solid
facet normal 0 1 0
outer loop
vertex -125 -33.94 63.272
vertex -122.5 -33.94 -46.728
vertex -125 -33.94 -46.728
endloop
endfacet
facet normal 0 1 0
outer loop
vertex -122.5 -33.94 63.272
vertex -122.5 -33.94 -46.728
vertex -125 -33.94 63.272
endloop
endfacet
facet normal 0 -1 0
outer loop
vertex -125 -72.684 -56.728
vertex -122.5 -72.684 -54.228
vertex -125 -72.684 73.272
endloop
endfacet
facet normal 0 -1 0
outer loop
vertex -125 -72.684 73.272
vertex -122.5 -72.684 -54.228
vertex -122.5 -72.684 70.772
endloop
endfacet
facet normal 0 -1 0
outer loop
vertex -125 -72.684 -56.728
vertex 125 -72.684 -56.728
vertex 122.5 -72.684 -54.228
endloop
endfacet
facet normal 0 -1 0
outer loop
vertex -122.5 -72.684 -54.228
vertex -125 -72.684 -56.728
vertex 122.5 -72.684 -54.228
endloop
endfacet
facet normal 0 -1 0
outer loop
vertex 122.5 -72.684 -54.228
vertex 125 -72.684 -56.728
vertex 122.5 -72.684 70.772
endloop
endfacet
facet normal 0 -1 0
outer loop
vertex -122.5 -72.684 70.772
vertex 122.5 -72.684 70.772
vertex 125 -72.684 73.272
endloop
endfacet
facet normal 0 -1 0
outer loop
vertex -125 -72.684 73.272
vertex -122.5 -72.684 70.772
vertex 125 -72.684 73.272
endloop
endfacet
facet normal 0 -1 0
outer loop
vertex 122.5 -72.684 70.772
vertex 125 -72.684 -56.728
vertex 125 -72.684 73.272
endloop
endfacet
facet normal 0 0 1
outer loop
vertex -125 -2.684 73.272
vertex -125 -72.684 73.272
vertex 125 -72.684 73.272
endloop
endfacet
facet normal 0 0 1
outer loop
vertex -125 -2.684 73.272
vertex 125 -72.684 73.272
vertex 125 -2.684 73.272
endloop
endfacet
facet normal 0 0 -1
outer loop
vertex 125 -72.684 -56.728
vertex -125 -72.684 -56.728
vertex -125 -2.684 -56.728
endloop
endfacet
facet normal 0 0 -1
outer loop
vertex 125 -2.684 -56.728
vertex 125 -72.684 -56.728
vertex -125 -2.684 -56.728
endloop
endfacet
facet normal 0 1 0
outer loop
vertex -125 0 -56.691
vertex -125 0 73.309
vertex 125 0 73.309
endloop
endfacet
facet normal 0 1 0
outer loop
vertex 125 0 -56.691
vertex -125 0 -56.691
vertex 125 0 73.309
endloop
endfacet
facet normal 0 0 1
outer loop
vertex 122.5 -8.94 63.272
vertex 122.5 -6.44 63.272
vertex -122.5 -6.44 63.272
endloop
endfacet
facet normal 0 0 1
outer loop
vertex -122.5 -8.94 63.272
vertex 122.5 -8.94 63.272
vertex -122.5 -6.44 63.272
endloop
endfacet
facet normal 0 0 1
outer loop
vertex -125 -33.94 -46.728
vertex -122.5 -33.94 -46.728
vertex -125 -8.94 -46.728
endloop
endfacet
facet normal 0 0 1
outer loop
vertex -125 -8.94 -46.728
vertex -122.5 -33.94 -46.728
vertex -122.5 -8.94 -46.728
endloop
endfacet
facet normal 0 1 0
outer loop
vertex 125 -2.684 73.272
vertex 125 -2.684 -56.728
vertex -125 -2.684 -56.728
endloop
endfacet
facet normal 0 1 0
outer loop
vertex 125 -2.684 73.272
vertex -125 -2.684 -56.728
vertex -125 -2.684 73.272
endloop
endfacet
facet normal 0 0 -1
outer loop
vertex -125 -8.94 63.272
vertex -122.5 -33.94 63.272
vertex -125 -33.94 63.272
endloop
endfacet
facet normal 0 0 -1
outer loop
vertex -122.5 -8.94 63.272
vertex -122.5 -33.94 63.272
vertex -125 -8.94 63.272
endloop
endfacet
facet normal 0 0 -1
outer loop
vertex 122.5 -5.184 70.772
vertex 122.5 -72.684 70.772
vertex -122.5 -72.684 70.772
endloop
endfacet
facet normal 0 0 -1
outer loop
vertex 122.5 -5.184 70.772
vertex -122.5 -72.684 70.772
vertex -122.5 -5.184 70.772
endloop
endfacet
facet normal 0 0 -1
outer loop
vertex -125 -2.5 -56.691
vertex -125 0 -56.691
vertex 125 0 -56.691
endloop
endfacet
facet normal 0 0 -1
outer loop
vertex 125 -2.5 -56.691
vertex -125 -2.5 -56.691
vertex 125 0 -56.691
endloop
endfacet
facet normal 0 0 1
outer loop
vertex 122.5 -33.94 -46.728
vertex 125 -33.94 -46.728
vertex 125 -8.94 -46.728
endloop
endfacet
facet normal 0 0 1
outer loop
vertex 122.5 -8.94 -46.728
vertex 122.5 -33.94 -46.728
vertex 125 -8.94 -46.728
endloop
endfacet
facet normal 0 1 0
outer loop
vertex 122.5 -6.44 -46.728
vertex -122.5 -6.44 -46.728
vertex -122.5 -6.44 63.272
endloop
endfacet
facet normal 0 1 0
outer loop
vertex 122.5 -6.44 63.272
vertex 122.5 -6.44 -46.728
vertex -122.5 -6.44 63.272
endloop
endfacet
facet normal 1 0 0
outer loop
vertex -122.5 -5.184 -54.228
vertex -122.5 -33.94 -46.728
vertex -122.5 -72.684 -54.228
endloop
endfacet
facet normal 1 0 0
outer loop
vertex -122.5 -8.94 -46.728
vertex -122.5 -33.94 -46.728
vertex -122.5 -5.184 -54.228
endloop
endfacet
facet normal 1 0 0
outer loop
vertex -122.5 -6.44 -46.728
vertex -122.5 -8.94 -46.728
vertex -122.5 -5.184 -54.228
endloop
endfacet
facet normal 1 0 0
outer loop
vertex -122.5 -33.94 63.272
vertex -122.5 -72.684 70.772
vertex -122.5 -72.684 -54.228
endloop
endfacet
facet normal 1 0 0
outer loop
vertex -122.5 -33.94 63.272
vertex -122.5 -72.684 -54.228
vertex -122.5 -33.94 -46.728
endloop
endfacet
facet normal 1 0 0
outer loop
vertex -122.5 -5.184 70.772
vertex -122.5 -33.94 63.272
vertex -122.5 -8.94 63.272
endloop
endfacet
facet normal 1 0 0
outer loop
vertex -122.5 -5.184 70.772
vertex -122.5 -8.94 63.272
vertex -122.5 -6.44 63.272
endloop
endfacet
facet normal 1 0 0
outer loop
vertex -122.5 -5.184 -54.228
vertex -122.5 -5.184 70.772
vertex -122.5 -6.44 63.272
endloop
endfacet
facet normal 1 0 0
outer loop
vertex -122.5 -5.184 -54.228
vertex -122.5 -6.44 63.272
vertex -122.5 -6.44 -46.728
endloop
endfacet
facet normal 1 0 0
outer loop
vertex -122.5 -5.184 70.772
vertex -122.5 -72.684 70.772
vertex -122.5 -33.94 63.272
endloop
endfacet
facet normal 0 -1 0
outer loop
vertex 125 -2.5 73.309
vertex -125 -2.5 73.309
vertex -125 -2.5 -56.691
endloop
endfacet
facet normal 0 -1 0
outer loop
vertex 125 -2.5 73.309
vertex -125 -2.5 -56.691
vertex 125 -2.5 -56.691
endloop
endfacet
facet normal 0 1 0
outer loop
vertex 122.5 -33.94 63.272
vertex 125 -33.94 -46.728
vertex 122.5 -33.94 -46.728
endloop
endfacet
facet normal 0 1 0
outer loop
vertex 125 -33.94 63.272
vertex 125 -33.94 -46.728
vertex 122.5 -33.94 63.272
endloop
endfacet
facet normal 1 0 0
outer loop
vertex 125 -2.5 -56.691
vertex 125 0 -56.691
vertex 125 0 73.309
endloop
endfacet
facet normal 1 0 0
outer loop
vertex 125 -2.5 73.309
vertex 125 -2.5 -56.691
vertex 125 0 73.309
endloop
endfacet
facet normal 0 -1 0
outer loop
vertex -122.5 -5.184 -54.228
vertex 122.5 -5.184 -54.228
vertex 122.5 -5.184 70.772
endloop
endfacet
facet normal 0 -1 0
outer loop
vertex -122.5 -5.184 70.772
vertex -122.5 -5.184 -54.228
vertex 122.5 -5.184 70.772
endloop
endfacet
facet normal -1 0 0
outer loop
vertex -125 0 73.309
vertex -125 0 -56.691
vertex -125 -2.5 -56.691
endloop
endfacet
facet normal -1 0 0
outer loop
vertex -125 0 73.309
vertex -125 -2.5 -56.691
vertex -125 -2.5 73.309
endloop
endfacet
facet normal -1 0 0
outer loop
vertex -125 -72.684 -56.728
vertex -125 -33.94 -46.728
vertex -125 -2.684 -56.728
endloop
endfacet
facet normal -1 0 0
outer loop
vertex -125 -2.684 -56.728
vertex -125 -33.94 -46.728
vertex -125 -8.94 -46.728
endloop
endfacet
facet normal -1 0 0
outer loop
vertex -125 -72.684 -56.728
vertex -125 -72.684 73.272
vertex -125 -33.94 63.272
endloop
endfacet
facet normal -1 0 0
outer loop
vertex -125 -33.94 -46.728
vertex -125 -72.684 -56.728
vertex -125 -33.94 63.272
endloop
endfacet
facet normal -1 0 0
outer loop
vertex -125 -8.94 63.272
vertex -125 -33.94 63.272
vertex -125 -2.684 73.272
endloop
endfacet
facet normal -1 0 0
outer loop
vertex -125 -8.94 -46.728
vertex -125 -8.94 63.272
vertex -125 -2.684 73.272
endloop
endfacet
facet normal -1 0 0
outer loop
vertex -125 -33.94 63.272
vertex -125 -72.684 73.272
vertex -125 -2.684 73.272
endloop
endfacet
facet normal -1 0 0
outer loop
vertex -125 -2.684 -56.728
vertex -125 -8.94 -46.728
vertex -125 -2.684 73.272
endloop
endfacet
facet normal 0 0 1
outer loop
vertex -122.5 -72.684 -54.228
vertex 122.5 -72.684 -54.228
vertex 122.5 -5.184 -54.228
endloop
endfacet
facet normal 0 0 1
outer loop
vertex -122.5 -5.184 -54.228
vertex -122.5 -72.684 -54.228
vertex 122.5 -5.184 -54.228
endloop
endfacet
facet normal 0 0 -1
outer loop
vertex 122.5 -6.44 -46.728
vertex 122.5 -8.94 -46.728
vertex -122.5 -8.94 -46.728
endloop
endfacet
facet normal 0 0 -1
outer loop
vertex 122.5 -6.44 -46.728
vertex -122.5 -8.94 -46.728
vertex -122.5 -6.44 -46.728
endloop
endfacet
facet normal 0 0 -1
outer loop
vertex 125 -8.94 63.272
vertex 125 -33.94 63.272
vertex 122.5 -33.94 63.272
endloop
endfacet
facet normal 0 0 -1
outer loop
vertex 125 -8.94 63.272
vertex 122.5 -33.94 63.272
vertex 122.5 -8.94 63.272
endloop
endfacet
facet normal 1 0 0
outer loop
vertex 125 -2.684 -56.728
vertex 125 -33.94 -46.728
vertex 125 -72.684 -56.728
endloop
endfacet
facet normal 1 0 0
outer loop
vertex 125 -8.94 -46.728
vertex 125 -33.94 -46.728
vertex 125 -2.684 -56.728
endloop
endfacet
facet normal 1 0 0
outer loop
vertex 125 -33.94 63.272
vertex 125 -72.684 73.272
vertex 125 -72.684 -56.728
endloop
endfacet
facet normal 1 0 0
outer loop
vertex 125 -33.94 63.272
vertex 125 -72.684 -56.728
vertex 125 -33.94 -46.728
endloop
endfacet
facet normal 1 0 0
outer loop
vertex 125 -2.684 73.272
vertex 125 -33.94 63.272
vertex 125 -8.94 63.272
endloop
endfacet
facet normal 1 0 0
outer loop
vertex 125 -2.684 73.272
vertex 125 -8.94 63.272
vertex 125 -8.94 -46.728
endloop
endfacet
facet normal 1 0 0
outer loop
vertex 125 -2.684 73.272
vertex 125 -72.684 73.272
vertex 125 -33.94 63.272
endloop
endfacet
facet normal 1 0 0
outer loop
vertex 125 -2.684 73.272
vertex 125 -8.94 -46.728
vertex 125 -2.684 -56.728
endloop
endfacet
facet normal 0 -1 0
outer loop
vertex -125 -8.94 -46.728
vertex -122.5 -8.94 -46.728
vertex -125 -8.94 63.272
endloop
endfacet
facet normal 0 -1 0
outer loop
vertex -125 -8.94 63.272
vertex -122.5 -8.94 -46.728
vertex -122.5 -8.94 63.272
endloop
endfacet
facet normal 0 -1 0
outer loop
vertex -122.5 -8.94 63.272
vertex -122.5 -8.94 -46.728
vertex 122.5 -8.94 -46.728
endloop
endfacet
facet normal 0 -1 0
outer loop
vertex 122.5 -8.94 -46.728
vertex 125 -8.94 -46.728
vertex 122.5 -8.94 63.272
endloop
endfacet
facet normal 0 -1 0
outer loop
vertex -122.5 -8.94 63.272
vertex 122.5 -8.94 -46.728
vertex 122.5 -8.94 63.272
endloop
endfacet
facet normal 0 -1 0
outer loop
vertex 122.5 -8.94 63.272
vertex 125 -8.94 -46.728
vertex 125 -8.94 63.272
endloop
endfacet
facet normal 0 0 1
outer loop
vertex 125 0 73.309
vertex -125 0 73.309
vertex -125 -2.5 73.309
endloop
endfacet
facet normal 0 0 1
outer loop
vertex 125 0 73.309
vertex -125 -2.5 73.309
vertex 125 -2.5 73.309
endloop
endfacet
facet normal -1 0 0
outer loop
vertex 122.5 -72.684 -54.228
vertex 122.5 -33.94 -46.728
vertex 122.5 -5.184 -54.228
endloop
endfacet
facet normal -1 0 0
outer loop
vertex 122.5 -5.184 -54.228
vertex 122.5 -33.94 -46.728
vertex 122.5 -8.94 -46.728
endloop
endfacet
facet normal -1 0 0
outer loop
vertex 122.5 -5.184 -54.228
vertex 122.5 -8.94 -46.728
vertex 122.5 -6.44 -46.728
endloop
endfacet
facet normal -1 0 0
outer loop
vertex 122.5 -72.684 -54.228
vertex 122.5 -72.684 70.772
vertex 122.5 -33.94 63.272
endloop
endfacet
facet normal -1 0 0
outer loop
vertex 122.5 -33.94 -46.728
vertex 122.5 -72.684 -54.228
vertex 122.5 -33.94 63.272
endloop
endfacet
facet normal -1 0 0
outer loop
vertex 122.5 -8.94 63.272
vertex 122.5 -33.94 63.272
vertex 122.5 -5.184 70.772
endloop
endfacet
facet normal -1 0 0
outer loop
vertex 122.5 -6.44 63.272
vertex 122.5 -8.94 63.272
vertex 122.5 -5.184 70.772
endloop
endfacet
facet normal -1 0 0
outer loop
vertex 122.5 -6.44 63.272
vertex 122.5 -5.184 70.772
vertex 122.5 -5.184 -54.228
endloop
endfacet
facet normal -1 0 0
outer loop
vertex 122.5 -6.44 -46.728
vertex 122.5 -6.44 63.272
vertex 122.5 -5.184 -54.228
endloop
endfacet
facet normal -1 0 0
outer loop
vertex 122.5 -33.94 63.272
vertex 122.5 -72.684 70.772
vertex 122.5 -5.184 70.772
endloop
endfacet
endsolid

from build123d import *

# Parameters (mm, degrees)
F0_W     = 250
F0_H     = 130
F1_DEPTH = 2.5
F2_W     = 70
F2_H     = 130
F2_W_2   = 25
F2_H_2   = 110
F3_DEPTH = 125
F4_T     = 2.5


# Not quite as in the source:
# - a shell that OpenCascade refuses in one call is made with other operations: the cavity is built on its own and cut out


with BuildPart() as f1:
    # F0 (on Front) → F1 (new body)
    with BuildSketch(Plane.XZ):
        with Locations((0, 8.3088127774)):
            Rectangle(F0_W, F0_H)
    extrude(amount=F1_DEPTH)


with BuildPart() as f3:
    # F2 (on Right) → F3 (new body, symmetric)
    with BuildSketch(Plane.YZ):
        with Locations((-37.6844966412, 8.2720792294)):
            Rectangle(F2_W, F2_H)
        with Locations((-21.439858526, 8.2720792294)):
            Rectangle(F2_W_2, F2_H_2, mode=Mode.SUBTRACT)
    extrude(amount=F3_DEPTH, both=True)

    # F4: shell of thickness 2.5, made by hand


with BuildPart() as f4_core1:
    # F4_t2: copy of F3
    add(f3.part)

    # the walls: a layer under each face that stays
    f4_faces = [f4_core1.faces().sort_by_distance(p)[0] for p in [
        (0, -2.6844966412, 8.2720792294),
        (0, -37.6844966412, -56.7279207706),
        (125, -37.6844966412, 8.2720792294),
        (0, -8.939858526, 8.2720792294),
        (0, -37.6844966412, 73.2720792294),
        (-125, -37.6844966412, 8.2720792294),
    ]]
    thicken(f4_faces, amount=-F4_T, mode=Mode.SUBTRACT)


with BuildPart() as f3_1:
    add(f3.part)

    # what is left inside the walls is the cavity
    f4_cavity = [f4_core1.part.solids().sort_by_distance(p)[0] for p in [
        (-40.833333, -5.209497, 8.272079),
    ]]
    add(f4_cavity, mode=Mode.SUBTRACT)


solid = Compound([f1.part, f3_1.part])
